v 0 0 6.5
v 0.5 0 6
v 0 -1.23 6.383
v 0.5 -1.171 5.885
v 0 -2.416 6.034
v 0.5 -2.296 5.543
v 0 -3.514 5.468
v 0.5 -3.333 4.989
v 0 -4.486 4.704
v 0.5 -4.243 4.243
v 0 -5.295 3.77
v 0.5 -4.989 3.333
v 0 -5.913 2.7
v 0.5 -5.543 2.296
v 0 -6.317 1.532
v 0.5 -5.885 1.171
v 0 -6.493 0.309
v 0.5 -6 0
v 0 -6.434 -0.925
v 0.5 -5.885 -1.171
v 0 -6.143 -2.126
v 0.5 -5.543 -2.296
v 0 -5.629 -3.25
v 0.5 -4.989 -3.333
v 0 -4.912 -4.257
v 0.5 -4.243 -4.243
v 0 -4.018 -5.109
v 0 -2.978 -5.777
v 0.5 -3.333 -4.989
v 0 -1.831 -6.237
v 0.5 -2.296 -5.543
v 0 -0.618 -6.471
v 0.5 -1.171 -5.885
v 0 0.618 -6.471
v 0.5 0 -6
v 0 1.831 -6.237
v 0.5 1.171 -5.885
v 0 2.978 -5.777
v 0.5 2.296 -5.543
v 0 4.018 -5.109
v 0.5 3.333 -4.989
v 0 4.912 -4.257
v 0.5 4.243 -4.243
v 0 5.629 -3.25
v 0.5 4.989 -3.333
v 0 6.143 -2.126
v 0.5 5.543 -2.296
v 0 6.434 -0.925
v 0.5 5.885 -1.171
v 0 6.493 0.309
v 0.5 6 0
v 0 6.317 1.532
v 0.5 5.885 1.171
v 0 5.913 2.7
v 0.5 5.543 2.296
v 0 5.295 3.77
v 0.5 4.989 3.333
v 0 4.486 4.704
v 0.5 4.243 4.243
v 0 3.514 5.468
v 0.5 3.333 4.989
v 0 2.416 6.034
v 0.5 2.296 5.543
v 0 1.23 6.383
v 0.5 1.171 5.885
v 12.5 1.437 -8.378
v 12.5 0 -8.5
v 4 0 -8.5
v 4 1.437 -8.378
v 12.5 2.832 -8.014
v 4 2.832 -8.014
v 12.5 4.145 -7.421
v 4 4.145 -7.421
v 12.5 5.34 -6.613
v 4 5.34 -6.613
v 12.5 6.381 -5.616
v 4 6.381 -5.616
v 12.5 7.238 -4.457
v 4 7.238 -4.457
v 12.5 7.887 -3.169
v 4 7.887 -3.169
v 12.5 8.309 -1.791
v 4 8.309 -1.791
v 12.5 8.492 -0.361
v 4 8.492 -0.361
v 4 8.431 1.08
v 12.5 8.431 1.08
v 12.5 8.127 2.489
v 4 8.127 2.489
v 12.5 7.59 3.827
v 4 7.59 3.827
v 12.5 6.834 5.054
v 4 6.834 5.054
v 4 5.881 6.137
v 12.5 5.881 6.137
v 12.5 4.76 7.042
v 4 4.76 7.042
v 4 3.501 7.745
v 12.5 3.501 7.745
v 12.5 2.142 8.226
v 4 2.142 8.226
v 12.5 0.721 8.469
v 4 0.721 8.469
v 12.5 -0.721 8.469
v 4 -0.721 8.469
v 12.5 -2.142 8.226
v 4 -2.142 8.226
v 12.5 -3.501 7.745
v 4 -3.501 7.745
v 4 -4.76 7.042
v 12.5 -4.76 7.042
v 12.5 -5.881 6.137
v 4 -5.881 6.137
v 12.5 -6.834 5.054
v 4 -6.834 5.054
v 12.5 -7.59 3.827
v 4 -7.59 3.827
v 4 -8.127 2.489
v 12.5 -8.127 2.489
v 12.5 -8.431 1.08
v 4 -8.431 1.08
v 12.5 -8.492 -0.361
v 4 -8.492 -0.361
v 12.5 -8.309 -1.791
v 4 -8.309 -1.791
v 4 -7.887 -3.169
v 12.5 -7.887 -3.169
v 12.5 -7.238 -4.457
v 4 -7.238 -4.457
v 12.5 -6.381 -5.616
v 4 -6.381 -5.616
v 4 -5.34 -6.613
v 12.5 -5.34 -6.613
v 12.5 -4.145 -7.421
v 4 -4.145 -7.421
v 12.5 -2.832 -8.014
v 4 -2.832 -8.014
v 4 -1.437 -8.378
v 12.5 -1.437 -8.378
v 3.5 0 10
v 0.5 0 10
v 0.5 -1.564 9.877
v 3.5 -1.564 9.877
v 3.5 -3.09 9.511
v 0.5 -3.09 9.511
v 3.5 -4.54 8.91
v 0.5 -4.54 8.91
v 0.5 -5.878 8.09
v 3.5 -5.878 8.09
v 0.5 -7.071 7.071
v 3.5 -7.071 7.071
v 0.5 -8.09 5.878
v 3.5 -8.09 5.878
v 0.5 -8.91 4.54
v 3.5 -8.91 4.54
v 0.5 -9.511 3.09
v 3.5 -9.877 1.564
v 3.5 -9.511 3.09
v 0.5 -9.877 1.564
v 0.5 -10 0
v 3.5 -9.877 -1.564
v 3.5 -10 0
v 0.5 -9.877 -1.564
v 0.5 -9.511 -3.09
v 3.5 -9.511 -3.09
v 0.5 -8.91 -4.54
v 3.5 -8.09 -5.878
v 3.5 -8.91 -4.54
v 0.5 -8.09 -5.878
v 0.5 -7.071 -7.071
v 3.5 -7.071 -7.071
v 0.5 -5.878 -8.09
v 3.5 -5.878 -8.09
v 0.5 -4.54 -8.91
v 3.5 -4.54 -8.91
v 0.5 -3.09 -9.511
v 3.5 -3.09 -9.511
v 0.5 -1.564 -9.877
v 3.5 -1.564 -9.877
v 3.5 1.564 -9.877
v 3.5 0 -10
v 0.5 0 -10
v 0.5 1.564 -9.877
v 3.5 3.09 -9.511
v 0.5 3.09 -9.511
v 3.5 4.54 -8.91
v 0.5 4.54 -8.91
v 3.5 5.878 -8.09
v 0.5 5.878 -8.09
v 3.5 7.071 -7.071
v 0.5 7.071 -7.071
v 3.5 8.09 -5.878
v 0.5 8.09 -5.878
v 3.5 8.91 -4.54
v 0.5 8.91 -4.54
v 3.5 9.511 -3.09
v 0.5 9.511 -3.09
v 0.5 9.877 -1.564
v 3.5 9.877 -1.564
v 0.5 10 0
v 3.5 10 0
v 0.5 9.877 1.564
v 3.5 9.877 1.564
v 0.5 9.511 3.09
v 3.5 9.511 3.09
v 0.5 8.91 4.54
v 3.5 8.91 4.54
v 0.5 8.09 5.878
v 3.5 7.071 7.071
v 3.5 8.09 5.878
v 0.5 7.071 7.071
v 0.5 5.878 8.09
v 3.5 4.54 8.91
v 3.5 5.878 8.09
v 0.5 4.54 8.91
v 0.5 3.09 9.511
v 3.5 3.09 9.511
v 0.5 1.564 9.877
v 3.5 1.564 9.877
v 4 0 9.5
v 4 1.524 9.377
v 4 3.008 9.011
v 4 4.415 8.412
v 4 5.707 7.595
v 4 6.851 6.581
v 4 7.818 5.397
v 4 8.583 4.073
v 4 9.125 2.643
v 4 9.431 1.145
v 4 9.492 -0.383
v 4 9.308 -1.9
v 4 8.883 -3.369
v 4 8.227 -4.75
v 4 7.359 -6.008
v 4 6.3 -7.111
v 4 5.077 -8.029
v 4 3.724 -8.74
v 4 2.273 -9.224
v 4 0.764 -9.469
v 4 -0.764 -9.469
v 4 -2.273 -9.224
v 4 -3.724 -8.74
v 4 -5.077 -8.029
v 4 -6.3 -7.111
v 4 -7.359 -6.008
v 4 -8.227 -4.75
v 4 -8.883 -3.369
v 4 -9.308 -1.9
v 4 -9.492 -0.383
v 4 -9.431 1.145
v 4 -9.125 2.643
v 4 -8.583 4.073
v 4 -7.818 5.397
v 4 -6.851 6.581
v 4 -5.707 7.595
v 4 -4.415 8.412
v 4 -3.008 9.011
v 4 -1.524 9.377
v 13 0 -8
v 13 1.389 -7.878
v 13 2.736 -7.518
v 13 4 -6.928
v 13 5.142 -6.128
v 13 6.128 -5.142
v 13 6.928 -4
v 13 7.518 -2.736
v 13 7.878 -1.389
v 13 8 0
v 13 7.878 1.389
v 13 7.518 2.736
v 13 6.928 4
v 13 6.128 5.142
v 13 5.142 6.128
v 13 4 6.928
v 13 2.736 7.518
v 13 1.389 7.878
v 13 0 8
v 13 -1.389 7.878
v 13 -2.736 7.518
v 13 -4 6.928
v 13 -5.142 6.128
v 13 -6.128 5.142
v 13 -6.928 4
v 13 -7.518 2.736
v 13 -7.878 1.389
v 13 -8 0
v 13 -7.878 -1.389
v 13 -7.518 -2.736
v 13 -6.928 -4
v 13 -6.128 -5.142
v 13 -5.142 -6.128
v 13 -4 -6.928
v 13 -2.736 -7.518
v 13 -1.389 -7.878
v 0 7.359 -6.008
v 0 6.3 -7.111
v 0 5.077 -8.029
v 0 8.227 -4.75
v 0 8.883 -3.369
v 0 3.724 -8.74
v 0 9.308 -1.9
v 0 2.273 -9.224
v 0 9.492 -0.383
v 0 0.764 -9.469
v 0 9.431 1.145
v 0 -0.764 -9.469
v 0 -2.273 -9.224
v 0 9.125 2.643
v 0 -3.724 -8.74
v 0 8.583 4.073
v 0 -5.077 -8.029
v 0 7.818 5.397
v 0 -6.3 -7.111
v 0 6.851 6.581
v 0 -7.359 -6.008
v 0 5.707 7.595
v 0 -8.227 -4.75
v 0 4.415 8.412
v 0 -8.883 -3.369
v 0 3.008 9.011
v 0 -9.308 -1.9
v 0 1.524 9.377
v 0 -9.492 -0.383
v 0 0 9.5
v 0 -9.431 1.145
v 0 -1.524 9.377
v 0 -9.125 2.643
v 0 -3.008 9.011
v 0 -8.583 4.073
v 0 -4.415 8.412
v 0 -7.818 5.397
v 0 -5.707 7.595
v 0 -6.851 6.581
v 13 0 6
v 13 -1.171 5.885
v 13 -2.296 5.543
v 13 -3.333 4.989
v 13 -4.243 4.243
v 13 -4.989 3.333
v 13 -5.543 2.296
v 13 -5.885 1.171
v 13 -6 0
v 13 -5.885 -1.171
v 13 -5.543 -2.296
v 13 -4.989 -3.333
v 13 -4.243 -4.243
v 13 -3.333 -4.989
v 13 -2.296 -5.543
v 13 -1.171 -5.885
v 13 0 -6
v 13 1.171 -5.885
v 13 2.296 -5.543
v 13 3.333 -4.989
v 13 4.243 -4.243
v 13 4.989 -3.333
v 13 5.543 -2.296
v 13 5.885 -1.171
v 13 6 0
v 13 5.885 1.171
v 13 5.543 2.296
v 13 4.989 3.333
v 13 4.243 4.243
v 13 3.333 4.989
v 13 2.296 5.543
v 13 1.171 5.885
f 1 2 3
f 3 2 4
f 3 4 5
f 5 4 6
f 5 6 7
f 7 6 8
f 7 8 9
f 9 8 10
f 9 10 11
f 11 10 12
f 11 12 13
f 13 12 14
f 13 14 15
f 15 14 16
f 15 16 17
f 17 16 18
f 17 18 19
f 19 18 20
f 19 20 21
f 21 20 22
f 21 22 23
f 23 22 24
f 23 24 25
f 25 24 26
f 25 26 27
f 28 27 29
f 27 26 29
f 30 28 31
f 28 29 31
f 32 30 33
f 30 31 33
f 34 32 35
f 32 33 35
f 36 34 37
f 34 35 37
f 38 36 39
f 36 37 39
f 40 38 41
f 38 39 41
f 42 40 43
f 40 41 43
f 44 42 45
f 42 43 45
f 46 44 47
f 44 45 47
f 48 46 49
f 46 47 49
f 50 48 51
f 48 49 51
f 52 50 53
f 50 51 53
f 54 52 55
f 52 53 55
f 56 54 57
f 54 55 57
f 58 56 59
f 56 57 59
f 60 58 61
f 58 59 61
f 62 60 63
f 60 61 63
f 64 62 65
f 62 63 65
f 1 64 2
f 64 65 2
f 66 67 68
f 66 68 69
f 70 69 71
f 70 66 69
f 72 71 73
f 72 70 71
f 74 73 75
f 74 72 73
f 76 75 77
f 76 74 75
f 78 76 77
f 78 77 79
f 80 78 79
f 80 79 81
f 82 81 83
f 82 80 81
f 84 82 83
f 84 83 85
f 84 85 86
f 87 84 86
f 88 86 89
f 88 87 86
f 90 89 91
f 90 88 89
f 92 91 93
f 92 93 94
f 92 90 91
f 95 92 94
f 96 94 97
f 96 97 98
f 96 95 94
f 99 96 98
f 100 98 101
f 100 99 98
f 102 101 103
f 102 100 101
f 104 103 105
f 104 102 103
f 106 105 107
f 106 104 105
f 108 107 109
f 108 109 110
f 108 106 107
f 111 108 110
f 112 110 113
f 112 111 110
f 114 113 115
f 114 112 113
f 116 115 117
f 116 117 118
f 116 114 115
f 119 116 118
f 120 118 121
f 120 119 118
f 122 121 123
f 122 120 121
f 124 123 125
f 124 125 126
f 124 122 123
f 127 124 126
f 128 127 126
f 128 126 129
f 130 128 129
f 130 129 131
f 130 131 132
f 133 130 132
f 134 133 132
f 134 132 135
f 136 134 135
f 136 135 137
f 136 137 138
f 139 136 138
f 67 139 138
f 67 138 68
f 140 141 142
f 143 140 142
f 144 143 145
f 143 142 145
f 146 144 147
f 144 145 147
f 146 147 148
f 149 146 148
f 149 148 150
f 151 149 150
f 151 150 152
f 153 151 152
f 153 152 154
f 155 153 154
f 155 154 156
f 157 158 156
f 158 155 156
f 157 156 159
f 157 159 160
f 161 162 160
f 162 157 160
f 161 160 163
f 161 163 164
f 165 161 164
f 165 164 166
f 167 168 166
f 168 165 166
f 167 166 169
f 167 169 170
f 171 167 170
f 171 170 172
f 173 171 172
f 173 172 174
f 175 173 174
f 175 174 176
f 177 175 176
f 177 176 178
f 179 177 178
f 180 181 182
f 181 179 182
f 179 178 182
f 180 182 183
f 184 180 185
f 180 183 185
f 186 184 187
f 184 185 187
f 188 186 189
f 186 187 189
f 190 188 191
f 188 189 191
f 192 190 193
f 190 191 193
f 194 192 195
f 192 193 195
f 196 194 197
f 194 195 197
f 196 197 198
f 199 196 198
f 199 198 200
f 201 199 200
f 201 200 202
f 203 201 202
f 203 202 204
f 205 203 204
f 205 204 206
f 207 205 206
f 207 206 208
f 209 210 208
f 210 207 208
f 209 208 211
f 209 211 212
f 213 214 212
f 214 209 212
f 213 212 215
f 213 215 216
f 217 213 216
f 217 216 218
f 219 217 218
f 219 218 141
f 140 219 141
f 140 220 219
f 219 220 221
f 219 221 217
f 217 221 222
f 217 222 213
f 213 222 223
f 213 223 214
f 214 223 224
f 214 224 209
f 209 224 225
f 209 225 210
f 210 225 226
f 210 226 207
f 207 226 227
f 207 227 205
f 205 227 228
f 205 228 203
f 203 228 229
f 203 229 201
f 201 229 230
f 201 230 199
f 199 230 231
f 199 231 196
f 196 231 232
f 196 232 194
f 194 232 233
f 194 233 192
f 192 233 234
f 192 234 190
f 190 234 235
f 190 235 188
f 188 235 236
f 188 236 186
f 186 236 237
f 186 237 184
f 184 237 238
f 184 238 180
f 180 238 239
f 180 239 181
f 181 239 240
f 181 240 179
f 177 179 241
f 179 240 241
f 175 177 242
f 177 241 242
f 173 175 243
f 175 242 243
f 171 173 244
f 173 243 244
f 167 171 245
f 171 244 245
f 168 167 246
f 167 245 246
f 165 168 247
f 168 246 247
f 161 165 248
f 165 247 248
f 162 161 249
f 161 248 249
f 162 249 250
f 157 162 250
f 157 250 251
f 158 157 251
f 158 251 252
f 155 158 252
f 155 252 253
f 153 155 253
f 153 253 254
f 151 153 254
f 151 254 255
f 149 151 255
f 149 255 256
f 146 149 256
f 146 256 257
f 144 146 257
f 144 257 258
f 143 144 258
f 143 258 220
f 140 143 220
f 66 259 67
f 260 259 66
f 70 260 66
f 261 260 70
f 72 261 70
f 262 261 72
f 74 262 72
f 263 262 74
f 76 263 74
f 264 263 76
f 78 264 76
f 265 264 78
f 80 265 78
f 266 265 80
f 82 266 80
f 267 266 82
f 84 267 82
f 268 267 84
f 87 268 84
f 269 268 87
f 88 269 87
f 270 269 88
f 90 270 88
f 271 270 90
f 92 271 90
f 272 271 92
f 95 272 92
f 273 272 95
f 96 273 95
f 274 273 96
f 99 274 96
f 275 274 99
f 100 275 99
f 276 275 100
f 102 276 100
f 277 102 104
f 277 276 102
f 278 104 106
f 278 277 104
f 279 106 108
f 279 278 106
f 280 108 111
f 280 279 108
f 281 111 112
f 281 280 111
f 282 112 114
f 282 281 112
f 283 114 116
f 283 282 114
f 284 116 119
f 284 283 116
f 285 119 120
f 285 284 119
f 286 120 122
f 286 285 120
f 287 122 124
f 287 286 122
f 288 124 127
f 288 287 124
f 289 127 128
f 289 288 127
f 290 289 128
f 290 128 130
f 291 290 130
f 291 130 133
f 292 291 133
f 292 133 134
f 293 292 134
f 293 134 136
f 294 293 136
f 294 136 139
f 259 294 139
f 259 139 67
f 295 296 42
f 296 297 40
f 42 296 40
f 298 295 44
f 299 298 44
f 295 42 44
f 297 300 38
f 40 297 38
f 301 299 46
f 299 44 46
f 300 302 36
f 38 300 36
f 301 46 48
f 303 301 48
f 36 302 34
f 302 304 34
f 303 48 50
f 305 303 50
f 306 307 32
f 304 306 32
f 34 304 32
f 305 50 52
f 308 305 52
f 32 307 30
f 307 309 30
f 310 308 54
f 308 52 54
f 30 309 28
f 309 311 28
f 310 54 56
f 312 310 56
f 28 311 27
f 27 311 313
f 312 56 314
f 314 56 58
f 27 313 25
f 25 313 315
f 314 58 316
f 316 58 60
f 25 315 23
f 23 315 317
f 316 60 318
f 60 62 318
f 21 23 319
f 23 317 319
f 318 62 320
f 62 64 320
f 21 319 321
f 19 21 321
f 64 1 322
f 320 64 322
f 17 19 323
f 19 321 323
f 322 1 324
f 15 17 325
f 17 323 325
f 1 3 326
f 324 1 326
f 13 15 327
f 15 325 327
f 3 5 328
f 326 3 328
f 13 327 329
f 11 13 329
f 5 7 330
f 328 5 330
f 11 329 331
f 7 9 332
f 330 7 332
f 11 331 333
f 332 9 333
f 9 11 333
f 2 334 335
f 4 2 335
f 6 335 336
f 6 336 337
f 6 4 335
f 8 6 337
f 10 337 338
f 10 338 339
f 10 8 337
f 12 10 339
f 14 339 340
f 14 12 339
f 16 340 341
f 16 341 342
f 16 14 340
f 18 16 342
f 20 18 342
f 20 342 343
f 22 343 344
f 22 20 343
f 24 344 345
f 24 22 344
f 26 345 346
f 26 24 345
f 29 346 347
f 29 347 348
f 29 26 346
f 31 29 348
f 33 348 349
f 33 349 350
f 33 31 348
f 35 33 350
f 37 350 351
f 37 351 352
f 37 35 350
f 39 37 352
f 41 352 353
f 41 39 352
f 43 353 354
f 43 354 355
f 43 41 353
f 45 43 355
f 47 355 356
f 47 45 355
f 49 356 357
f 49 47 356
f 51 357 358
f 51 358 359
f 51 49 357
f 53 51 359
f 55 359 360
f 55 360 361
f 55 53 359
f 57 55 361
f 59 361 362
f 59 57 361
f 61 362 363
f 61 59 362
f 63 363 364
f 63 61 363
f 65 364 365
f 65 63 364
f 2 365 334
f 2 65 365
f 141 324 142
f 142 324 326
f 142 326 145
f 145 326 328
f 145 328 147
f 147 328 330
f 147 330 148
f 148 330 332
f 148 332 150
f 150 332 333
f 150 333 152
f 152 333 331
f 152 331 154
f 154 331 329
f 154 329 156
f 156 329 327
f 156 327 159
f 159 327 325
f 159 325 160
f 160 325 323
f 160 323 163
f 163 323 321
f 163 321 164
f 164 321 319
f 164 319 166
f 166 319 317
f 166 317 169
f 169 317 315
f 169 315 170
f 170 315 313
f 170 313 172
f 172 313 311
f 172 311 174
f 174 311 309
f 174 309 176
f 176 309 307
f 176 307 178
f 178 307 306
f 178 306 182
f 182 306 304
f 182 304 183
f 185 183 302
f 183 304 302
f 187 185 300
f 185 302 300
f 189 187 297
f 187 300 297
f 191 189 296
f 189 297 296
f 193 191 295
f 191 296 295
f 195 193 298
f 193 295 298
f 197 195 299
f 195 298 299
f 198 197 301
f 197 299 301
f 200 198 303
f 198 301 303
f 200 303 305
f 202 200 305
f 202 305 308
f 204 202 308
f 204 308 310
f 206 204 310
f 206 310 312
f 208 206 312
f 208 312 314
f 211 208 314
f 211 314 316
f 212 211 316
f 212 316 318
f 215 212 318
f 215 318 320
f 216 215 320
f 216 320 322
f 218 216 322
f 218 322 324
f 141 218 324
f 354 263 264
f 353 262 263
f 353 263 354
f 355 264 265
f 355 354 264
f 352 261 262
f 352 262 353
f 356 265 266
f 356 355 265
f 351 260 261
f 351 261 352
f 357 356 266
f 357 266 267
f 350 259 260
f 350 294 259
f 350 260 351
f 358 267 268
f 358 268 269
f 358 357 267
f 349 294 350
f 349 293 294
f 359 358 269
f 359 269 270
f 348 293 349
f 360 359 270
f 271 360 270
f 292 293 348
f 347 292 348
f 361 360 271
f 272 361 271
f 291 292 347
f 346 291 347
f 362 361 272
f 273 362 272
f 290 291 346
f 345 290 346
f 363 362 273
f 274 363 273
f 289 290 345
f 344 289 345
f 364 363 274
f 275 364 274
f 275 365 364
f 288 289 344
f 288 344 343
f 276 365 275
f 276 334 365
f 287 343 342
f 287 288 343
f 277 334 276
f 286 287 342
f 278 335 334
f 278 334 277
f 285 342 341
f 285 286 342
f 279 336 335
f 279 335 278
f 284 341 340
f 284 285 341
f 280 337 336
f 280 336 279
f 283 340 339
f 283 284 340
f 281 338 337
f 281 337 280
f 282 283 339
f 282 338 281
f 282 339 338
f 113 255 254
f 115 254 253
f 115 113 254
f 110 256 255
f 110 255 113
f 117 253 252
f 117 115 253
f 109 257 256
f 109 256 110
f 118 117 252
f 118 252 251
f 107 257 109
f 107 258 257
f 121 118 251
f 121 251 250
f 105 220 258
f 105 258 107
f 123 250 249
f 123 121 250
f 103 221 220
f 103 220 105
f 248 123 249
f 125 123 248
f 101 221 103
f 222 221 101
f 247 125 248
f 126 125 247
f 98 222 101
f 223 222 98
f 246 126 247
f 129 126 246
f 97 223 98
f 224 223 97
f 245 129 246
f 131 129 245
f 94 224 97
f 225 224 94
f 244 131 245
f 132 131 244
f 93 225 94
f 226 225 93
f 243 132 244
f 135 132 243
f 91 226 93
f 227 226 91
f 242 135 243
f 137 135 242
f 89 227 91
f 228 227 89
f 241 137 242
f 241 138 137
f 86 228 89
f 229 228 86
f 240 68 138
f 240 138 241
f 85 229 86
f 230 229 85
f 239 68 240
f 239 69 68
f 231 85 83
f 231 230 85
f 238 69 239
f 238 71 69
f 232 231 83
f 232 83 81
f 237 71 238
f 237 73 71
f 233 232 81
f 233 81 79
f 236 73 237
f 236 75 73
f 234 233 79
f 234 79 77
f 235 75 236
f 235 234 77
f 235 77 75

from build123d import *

# Parameters (mm, degrees)
SKETCH_1_R          = 10
SKETCH_1_R_2        = 6
EXTRUDE_2_DEPTH     = 13
SKETCH_2_OUTSIDE_W  = 28.226
SKETCH_2_OUTSIDE_H  = 28.226
SKETCH_2_OUTSIDE_R  = 8.5
CUT_EXTRUDE_1_DEPTH = 9
CHAMFER_1_SIZE      = 0.5


with BuildPart() as part:
    # 草图1 → 凸台-拉伸2 (new body)
    with BuildSketch(Plane(origin=(0, 0, 0), x_dir=(0, 0, -1), z_dir=(1, 0, 0))):
        with Locations(Location((0, 0, 0), (0, 0, 180))):
            Circle(SKETCH_1_R)
        with Locations(Location((0, 0, 0), (0, 0, 180))):
            Circle(SKETCH_1_R_2, mode=Mode.SUBTRACT)
    extrude(amount=EXTRUDE_2_DEPTH)

    # 草图2 outside → 切除-拉伸1 (cut)
    with BuildSketch(Plane(origin=(13, 0, 0), x_dir=(0, 0, -1), z_dir=(1, 0, 0))):
        Rectangle(SKETCH_2_OUTSIDE_W, SKETCH_2_OUTSIDE_H)
        Circle(SKETCH_2_OUTSIDE_R, mode=Mode.SUBTRACT)
    extrude(amount=-CUT_EXTRUDE_1_DEPTH, mode=Mode.SUBTRACT)

    # 倒角1
    chamfer_1_edges = [part.edges().sort_by_distance(p)[0] for p in [
        (4, 0, -10),
        (13, 0, 8.5),
        (0, 0, -10),
        (0, 0, -6),
    ]]
    chamfer(chamfer_1_edges, length=CHAMFER_1_SIZE)


solid = part.part
